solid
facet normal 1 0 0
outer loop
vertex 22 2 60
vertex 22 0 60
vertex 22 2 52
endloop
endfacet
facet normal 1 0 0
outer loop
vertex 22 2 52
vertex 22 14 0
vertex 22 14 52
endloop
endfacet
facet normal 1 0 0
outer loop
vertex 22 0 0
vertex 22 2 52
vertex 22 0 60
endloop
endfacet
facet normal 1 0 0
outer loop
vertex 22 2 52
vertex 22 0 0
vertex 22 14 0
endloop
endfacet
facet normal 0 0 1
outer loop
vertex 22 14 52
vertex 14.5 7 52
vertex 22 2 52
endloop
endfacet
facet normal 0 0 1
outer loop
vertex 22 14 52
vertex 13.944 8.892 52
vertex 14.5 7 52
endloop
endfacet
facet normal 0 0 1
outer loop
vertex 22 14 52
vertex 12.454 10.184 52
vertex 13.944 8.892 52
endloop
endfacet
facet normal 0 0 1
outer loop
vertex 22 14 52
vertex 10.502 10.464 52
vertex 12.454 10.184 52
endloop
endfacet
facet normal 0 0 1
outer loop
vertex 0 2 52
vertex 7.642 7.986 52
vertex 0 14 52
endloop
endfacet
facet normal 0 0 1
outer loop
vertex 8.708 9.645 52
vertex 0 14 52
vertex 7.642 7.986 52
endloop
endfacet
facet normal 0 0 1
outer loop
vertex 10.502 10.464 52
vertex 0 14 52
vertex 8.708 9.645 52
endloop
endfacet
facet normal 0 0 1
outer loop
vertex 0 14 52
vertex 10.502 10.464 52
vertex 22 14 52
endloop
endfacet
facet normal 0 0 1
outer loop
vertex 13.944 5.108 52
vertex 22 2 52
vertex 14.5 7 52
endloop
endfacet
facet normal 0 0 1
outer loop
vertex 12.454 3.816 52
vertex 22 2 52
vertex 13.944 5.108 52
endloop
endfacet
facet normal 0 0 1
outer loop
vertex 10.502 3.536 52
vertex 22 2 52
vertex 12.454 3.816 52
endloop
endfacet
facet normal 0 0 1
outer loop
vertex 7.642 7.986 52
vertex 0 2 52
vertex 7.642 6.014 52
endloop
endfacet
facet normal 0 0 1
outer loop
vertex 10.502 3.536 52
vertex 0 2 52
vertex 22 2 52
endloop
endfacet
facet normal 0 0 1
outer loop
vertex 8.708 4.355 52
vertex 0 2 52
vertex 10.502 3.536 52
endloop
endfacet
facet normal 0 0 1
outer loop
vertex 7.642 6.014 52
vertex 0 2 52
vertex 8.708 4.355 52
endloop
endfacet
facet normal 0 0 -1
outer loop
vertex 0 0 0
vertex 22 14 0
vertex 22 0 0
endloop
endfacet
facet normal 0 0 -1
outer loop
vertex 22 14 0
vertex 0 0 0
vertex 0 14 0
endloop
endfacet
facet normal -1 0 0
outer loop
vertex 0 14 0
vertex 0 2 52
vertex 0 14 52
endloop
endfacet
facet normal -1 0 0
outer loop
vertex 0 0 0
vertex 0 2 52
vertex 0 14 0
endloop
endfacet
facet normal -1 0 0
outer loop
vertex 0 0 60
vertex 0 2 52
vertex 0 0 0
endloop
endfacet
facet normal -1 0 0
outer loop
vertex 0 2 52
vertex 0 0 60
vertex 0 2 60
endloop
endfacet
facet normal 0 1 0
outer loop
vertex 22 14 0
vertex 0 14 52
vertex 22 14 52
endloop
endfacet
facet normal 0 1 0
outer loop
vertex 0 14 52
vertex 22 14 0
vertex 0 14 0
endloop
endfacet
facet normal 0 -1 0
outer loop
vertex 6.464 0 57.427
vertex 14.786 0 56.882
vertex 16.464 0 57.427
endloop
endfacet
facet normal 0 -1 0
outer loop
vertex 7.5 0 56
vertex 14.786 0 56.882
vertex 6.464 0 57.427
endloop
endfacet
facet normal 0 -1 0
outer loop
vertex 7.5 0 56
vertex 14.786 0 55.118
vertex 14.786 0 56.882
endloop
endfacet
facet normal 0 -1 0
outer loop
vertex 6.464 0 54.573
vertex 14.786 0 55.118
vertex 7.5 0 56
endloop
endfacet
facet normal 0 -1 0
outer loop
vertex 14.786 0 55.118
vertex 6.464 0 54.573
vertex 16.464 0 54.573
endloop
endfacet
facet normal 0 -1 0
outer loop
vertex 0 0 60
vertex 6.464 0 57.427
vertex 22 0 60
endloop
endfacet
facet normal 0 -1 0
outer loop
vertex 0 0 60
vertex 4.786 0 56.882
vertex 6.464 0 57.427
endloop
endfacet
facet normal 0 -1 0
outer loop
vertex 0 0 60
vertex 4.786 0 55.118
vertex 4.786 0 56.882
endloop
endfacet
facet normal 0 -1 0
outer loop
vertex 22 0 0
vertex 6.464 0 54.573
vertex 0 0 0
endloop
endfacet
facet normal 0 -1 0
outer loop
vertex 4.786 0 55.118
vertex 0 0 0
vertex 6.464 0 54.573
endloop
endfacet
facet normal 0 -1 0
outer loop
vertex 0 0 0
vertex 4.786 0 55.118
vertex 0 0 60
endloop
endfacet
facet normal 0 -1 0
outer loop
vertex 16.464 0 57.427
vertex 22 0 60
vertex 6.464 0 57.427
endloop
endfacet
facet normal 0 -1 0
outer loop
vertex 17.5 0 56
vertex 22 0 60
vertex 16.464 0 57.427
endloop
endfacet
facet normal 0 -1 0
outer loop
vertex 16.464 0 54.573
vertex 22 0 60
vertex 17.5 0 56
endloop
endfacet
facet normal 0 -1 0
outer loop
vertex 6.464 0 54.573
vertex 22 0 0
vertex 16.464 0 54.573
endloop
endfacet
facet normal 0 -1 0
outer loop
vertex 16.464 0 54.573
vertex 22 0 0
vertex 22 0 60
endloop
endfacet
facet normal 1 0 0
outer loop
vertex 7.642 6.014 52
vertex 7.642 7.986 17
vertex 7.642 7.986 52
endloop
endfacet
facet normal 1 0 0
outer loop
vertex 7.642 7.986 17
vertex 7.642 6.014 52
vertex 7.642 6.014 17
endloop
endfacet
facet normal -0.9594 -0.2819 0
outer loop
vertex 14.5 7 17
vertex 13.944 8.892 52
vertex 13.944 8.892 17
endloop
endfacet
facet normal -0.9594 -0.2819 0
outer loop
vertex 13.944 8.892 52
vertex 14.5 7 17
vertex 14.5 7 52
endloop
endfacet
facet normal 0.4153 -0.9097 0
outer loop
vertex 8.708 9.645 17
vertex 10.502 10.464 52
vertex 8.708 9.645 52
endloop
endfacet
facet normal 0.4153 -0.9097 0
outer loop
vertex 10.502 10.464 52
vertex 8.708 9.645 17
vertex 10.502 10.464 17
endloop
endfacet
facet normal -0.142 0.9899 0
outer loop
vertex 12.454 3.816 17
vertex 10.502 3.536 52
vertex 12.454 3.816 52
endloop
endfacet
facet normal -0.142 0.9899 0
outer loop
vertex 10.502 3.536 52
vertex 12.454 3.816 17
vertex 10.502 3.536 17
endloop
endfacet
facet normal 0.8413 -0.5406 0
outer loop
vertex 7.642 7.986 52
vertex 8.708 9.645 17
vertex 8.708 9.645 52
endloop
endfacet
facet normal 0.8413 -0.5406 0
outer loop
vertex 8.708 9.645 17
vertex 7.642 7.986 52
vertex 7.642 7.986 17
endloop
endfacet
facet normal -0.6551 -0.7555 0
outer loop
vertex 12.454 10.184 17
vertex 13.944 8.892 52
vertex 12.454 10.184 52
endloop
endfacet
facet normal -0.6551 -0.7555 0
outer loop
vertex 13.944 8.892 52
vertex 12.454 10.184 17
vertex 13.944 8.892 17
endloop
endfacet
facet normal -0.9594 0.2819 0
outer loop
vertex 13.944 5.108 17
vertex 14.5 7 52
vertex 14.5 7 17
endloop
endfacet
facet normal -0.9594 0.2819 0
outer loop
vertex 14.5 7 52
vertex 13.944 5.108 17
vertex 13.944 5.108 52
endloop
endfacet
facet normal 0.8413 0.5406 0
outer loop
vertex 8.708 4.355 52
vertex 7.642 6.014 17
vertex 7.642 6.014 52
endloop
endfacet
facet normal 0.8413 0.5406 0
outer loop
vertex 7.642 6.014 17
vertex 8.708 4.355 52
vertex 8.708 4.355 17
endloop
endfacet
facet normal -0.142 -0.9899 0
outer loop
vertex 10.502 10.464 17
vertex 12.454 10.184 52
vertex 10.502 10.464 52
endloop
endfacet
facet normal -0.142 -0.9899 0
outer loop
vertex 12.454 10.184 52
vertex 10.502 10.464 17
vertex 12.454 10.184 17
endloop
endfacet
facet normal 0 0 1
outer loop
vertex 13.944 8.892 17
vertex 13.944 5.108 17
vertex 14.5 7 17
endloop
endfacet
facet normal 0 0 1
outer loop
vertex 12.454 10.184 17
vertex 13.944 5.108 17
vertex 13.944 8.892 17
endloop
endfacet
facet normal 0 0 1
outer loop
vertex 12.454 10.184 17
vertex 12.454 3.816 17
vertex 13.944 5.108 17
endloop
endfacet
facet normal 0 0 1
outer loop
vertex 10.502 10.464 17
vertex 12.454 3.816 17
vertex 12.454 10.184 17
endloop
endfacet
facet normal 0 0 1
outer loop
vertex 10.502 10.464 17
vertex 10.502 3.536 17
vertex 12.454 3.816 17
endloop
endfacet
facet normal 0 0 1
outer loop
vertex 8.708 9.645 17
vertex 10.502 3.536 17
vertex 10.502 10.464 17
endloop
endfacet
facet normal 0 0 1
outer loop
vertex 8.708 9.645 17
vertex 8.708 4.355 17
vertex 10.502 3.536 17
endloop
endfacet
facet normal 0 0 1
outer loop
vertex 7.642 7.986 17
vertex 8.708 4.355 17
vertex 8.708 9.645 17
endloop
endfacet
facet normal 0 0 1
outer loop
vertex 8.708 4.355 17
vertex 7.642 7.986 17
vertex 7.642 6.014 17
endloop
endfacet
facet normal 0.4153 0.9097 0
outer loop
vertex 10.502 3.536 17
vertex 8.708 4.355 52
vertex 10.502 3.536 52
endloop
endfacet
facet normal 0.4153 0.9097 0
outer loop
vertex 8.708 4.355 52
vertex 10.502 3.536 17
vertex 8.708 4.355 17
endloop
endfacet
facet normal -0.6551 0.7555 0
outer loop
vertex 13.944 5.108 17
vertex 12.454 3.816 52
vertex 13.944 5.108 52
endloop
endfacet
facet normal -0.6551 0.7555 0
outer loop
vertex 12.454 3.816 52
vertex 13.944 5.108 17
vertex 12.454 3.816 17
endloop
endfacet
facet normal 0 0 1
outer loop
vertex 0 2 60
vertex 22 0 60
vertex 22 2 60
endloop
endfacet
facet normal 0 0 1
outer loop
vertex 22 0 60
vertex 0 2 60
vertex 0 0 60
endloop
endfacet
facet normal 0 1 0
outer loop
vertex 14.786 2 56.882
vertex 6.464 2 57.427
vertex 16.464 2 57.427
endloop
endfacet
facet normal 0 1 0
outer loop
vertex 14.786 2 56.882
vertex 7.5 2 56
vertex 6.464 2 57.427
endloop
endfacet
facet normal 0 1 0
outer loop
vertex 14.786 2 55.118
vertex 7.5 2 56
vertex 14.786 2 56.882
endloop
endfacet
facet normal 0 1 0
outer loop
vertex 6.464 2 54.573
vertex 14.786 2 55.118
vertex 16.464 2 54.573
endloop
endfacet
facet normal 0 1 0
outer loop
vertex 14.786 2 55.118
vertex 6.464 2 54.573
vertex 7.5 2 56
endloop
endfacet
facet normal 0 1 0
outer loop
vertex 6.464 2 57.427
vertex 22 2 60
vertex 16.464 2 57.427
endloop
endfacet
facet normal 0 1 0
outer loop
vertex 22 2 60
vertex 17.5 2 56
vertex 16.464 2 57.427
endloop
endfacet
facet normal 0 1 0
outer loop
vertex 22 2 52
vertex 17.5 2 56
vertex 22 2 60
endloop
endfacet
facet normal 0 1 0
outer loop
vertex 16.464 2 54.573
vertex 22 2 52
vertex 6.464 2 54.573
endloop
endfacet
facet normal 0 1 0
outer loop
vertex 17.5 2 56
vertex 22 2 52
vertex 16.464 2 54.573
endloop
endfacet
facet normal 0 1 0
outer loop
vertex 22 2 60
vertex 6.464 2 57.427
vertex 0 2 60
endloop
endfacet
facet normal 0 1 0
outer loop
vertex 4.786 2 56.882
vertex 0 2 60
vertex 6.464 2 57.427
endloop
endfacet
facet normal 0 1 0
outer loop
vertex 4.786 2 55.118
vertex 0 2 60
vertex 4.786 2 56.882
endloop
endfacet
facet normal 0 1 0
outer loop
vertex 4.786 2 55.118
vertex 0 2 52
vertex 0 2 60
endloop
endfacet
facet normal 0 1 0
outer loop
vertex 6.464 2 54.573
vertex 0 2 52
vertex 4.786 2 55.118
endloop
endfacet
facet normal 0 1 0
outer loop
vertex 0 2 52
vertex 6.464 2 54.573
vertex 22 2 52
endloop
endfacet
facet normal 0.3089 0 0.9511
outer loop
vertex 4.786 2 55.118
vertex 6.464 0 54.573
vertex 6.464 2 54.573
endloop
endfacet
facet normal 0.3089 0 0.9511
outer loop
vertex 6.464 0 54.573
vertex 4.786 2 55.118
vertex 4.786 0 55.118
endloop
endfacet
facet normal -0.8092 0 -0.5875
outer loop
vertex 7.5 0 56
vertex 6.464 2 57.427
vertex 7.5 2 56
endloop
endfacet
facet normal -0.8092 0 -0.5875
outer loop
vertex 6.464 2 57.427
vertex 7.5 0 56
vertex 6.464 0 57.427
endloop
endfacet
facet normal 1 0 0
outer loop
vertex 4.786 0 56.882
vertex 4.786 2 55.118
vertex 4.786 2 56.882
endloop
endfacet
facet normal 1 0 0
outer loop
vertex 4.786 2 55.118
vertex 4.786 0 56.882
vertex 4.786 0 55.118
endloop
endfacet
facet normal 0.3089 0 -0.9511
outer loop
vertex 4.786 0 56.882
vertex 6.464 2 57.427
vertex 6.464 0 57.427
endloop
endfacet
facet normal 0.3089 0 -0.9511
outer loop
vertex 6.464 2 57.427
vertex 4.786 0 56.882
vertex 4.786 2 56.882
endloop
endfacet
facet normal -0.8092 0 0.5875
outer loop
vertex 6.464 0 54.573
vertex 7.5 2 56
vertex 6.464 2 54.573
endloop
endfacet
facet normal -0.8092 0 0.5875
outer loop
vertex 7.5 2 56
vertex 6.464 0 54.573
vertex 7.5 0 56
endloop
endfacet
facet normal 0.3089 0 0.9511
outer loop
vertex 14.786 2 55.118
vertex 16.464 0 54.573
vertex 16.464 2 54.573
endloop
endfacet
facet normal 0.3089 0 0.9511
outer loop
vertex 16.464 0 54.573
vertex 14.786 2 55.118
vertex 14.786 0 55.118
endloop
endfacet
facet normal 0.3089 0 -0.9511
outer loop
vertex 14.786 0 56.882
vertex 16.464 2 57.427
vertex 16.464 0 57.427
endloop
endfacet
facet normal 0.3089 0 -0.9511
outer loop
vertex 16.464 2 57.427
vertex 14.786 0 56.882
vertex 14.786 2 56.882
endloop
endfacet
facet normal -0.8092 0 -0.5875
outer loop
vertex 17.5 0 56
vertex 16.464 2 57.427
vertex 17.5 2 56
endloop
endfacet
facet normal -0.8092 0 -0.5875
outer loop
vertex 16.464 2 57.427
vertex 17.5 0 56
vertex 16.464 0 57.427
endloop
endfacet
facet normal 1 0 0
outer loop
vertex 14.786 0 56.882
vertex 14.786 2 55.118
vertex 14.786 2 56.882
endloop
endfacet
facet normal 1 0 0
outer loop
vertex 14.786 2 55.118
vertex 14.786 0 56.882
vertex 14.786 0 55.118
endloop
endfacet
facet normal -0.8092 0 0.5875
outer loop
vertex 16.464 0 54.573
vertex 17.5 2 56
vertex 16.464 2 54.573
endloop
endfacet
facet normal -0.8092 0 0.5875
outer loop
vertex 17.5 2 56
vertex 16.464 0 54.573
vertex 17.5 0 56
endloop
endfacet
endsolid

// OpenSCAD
difference()
{
	cube([22,14,52]);
	translate([11,7,17]) cylinder(h=36,d=7);
}
difference()
{
	cube([22,2,60]);
	translate([6,3,56]) rotate([90,0,0]) cylinder(h=4,d=3);
	translate([16,3,56]) rotate([90,0,0]) cylinder(h=4,d=3);
}
